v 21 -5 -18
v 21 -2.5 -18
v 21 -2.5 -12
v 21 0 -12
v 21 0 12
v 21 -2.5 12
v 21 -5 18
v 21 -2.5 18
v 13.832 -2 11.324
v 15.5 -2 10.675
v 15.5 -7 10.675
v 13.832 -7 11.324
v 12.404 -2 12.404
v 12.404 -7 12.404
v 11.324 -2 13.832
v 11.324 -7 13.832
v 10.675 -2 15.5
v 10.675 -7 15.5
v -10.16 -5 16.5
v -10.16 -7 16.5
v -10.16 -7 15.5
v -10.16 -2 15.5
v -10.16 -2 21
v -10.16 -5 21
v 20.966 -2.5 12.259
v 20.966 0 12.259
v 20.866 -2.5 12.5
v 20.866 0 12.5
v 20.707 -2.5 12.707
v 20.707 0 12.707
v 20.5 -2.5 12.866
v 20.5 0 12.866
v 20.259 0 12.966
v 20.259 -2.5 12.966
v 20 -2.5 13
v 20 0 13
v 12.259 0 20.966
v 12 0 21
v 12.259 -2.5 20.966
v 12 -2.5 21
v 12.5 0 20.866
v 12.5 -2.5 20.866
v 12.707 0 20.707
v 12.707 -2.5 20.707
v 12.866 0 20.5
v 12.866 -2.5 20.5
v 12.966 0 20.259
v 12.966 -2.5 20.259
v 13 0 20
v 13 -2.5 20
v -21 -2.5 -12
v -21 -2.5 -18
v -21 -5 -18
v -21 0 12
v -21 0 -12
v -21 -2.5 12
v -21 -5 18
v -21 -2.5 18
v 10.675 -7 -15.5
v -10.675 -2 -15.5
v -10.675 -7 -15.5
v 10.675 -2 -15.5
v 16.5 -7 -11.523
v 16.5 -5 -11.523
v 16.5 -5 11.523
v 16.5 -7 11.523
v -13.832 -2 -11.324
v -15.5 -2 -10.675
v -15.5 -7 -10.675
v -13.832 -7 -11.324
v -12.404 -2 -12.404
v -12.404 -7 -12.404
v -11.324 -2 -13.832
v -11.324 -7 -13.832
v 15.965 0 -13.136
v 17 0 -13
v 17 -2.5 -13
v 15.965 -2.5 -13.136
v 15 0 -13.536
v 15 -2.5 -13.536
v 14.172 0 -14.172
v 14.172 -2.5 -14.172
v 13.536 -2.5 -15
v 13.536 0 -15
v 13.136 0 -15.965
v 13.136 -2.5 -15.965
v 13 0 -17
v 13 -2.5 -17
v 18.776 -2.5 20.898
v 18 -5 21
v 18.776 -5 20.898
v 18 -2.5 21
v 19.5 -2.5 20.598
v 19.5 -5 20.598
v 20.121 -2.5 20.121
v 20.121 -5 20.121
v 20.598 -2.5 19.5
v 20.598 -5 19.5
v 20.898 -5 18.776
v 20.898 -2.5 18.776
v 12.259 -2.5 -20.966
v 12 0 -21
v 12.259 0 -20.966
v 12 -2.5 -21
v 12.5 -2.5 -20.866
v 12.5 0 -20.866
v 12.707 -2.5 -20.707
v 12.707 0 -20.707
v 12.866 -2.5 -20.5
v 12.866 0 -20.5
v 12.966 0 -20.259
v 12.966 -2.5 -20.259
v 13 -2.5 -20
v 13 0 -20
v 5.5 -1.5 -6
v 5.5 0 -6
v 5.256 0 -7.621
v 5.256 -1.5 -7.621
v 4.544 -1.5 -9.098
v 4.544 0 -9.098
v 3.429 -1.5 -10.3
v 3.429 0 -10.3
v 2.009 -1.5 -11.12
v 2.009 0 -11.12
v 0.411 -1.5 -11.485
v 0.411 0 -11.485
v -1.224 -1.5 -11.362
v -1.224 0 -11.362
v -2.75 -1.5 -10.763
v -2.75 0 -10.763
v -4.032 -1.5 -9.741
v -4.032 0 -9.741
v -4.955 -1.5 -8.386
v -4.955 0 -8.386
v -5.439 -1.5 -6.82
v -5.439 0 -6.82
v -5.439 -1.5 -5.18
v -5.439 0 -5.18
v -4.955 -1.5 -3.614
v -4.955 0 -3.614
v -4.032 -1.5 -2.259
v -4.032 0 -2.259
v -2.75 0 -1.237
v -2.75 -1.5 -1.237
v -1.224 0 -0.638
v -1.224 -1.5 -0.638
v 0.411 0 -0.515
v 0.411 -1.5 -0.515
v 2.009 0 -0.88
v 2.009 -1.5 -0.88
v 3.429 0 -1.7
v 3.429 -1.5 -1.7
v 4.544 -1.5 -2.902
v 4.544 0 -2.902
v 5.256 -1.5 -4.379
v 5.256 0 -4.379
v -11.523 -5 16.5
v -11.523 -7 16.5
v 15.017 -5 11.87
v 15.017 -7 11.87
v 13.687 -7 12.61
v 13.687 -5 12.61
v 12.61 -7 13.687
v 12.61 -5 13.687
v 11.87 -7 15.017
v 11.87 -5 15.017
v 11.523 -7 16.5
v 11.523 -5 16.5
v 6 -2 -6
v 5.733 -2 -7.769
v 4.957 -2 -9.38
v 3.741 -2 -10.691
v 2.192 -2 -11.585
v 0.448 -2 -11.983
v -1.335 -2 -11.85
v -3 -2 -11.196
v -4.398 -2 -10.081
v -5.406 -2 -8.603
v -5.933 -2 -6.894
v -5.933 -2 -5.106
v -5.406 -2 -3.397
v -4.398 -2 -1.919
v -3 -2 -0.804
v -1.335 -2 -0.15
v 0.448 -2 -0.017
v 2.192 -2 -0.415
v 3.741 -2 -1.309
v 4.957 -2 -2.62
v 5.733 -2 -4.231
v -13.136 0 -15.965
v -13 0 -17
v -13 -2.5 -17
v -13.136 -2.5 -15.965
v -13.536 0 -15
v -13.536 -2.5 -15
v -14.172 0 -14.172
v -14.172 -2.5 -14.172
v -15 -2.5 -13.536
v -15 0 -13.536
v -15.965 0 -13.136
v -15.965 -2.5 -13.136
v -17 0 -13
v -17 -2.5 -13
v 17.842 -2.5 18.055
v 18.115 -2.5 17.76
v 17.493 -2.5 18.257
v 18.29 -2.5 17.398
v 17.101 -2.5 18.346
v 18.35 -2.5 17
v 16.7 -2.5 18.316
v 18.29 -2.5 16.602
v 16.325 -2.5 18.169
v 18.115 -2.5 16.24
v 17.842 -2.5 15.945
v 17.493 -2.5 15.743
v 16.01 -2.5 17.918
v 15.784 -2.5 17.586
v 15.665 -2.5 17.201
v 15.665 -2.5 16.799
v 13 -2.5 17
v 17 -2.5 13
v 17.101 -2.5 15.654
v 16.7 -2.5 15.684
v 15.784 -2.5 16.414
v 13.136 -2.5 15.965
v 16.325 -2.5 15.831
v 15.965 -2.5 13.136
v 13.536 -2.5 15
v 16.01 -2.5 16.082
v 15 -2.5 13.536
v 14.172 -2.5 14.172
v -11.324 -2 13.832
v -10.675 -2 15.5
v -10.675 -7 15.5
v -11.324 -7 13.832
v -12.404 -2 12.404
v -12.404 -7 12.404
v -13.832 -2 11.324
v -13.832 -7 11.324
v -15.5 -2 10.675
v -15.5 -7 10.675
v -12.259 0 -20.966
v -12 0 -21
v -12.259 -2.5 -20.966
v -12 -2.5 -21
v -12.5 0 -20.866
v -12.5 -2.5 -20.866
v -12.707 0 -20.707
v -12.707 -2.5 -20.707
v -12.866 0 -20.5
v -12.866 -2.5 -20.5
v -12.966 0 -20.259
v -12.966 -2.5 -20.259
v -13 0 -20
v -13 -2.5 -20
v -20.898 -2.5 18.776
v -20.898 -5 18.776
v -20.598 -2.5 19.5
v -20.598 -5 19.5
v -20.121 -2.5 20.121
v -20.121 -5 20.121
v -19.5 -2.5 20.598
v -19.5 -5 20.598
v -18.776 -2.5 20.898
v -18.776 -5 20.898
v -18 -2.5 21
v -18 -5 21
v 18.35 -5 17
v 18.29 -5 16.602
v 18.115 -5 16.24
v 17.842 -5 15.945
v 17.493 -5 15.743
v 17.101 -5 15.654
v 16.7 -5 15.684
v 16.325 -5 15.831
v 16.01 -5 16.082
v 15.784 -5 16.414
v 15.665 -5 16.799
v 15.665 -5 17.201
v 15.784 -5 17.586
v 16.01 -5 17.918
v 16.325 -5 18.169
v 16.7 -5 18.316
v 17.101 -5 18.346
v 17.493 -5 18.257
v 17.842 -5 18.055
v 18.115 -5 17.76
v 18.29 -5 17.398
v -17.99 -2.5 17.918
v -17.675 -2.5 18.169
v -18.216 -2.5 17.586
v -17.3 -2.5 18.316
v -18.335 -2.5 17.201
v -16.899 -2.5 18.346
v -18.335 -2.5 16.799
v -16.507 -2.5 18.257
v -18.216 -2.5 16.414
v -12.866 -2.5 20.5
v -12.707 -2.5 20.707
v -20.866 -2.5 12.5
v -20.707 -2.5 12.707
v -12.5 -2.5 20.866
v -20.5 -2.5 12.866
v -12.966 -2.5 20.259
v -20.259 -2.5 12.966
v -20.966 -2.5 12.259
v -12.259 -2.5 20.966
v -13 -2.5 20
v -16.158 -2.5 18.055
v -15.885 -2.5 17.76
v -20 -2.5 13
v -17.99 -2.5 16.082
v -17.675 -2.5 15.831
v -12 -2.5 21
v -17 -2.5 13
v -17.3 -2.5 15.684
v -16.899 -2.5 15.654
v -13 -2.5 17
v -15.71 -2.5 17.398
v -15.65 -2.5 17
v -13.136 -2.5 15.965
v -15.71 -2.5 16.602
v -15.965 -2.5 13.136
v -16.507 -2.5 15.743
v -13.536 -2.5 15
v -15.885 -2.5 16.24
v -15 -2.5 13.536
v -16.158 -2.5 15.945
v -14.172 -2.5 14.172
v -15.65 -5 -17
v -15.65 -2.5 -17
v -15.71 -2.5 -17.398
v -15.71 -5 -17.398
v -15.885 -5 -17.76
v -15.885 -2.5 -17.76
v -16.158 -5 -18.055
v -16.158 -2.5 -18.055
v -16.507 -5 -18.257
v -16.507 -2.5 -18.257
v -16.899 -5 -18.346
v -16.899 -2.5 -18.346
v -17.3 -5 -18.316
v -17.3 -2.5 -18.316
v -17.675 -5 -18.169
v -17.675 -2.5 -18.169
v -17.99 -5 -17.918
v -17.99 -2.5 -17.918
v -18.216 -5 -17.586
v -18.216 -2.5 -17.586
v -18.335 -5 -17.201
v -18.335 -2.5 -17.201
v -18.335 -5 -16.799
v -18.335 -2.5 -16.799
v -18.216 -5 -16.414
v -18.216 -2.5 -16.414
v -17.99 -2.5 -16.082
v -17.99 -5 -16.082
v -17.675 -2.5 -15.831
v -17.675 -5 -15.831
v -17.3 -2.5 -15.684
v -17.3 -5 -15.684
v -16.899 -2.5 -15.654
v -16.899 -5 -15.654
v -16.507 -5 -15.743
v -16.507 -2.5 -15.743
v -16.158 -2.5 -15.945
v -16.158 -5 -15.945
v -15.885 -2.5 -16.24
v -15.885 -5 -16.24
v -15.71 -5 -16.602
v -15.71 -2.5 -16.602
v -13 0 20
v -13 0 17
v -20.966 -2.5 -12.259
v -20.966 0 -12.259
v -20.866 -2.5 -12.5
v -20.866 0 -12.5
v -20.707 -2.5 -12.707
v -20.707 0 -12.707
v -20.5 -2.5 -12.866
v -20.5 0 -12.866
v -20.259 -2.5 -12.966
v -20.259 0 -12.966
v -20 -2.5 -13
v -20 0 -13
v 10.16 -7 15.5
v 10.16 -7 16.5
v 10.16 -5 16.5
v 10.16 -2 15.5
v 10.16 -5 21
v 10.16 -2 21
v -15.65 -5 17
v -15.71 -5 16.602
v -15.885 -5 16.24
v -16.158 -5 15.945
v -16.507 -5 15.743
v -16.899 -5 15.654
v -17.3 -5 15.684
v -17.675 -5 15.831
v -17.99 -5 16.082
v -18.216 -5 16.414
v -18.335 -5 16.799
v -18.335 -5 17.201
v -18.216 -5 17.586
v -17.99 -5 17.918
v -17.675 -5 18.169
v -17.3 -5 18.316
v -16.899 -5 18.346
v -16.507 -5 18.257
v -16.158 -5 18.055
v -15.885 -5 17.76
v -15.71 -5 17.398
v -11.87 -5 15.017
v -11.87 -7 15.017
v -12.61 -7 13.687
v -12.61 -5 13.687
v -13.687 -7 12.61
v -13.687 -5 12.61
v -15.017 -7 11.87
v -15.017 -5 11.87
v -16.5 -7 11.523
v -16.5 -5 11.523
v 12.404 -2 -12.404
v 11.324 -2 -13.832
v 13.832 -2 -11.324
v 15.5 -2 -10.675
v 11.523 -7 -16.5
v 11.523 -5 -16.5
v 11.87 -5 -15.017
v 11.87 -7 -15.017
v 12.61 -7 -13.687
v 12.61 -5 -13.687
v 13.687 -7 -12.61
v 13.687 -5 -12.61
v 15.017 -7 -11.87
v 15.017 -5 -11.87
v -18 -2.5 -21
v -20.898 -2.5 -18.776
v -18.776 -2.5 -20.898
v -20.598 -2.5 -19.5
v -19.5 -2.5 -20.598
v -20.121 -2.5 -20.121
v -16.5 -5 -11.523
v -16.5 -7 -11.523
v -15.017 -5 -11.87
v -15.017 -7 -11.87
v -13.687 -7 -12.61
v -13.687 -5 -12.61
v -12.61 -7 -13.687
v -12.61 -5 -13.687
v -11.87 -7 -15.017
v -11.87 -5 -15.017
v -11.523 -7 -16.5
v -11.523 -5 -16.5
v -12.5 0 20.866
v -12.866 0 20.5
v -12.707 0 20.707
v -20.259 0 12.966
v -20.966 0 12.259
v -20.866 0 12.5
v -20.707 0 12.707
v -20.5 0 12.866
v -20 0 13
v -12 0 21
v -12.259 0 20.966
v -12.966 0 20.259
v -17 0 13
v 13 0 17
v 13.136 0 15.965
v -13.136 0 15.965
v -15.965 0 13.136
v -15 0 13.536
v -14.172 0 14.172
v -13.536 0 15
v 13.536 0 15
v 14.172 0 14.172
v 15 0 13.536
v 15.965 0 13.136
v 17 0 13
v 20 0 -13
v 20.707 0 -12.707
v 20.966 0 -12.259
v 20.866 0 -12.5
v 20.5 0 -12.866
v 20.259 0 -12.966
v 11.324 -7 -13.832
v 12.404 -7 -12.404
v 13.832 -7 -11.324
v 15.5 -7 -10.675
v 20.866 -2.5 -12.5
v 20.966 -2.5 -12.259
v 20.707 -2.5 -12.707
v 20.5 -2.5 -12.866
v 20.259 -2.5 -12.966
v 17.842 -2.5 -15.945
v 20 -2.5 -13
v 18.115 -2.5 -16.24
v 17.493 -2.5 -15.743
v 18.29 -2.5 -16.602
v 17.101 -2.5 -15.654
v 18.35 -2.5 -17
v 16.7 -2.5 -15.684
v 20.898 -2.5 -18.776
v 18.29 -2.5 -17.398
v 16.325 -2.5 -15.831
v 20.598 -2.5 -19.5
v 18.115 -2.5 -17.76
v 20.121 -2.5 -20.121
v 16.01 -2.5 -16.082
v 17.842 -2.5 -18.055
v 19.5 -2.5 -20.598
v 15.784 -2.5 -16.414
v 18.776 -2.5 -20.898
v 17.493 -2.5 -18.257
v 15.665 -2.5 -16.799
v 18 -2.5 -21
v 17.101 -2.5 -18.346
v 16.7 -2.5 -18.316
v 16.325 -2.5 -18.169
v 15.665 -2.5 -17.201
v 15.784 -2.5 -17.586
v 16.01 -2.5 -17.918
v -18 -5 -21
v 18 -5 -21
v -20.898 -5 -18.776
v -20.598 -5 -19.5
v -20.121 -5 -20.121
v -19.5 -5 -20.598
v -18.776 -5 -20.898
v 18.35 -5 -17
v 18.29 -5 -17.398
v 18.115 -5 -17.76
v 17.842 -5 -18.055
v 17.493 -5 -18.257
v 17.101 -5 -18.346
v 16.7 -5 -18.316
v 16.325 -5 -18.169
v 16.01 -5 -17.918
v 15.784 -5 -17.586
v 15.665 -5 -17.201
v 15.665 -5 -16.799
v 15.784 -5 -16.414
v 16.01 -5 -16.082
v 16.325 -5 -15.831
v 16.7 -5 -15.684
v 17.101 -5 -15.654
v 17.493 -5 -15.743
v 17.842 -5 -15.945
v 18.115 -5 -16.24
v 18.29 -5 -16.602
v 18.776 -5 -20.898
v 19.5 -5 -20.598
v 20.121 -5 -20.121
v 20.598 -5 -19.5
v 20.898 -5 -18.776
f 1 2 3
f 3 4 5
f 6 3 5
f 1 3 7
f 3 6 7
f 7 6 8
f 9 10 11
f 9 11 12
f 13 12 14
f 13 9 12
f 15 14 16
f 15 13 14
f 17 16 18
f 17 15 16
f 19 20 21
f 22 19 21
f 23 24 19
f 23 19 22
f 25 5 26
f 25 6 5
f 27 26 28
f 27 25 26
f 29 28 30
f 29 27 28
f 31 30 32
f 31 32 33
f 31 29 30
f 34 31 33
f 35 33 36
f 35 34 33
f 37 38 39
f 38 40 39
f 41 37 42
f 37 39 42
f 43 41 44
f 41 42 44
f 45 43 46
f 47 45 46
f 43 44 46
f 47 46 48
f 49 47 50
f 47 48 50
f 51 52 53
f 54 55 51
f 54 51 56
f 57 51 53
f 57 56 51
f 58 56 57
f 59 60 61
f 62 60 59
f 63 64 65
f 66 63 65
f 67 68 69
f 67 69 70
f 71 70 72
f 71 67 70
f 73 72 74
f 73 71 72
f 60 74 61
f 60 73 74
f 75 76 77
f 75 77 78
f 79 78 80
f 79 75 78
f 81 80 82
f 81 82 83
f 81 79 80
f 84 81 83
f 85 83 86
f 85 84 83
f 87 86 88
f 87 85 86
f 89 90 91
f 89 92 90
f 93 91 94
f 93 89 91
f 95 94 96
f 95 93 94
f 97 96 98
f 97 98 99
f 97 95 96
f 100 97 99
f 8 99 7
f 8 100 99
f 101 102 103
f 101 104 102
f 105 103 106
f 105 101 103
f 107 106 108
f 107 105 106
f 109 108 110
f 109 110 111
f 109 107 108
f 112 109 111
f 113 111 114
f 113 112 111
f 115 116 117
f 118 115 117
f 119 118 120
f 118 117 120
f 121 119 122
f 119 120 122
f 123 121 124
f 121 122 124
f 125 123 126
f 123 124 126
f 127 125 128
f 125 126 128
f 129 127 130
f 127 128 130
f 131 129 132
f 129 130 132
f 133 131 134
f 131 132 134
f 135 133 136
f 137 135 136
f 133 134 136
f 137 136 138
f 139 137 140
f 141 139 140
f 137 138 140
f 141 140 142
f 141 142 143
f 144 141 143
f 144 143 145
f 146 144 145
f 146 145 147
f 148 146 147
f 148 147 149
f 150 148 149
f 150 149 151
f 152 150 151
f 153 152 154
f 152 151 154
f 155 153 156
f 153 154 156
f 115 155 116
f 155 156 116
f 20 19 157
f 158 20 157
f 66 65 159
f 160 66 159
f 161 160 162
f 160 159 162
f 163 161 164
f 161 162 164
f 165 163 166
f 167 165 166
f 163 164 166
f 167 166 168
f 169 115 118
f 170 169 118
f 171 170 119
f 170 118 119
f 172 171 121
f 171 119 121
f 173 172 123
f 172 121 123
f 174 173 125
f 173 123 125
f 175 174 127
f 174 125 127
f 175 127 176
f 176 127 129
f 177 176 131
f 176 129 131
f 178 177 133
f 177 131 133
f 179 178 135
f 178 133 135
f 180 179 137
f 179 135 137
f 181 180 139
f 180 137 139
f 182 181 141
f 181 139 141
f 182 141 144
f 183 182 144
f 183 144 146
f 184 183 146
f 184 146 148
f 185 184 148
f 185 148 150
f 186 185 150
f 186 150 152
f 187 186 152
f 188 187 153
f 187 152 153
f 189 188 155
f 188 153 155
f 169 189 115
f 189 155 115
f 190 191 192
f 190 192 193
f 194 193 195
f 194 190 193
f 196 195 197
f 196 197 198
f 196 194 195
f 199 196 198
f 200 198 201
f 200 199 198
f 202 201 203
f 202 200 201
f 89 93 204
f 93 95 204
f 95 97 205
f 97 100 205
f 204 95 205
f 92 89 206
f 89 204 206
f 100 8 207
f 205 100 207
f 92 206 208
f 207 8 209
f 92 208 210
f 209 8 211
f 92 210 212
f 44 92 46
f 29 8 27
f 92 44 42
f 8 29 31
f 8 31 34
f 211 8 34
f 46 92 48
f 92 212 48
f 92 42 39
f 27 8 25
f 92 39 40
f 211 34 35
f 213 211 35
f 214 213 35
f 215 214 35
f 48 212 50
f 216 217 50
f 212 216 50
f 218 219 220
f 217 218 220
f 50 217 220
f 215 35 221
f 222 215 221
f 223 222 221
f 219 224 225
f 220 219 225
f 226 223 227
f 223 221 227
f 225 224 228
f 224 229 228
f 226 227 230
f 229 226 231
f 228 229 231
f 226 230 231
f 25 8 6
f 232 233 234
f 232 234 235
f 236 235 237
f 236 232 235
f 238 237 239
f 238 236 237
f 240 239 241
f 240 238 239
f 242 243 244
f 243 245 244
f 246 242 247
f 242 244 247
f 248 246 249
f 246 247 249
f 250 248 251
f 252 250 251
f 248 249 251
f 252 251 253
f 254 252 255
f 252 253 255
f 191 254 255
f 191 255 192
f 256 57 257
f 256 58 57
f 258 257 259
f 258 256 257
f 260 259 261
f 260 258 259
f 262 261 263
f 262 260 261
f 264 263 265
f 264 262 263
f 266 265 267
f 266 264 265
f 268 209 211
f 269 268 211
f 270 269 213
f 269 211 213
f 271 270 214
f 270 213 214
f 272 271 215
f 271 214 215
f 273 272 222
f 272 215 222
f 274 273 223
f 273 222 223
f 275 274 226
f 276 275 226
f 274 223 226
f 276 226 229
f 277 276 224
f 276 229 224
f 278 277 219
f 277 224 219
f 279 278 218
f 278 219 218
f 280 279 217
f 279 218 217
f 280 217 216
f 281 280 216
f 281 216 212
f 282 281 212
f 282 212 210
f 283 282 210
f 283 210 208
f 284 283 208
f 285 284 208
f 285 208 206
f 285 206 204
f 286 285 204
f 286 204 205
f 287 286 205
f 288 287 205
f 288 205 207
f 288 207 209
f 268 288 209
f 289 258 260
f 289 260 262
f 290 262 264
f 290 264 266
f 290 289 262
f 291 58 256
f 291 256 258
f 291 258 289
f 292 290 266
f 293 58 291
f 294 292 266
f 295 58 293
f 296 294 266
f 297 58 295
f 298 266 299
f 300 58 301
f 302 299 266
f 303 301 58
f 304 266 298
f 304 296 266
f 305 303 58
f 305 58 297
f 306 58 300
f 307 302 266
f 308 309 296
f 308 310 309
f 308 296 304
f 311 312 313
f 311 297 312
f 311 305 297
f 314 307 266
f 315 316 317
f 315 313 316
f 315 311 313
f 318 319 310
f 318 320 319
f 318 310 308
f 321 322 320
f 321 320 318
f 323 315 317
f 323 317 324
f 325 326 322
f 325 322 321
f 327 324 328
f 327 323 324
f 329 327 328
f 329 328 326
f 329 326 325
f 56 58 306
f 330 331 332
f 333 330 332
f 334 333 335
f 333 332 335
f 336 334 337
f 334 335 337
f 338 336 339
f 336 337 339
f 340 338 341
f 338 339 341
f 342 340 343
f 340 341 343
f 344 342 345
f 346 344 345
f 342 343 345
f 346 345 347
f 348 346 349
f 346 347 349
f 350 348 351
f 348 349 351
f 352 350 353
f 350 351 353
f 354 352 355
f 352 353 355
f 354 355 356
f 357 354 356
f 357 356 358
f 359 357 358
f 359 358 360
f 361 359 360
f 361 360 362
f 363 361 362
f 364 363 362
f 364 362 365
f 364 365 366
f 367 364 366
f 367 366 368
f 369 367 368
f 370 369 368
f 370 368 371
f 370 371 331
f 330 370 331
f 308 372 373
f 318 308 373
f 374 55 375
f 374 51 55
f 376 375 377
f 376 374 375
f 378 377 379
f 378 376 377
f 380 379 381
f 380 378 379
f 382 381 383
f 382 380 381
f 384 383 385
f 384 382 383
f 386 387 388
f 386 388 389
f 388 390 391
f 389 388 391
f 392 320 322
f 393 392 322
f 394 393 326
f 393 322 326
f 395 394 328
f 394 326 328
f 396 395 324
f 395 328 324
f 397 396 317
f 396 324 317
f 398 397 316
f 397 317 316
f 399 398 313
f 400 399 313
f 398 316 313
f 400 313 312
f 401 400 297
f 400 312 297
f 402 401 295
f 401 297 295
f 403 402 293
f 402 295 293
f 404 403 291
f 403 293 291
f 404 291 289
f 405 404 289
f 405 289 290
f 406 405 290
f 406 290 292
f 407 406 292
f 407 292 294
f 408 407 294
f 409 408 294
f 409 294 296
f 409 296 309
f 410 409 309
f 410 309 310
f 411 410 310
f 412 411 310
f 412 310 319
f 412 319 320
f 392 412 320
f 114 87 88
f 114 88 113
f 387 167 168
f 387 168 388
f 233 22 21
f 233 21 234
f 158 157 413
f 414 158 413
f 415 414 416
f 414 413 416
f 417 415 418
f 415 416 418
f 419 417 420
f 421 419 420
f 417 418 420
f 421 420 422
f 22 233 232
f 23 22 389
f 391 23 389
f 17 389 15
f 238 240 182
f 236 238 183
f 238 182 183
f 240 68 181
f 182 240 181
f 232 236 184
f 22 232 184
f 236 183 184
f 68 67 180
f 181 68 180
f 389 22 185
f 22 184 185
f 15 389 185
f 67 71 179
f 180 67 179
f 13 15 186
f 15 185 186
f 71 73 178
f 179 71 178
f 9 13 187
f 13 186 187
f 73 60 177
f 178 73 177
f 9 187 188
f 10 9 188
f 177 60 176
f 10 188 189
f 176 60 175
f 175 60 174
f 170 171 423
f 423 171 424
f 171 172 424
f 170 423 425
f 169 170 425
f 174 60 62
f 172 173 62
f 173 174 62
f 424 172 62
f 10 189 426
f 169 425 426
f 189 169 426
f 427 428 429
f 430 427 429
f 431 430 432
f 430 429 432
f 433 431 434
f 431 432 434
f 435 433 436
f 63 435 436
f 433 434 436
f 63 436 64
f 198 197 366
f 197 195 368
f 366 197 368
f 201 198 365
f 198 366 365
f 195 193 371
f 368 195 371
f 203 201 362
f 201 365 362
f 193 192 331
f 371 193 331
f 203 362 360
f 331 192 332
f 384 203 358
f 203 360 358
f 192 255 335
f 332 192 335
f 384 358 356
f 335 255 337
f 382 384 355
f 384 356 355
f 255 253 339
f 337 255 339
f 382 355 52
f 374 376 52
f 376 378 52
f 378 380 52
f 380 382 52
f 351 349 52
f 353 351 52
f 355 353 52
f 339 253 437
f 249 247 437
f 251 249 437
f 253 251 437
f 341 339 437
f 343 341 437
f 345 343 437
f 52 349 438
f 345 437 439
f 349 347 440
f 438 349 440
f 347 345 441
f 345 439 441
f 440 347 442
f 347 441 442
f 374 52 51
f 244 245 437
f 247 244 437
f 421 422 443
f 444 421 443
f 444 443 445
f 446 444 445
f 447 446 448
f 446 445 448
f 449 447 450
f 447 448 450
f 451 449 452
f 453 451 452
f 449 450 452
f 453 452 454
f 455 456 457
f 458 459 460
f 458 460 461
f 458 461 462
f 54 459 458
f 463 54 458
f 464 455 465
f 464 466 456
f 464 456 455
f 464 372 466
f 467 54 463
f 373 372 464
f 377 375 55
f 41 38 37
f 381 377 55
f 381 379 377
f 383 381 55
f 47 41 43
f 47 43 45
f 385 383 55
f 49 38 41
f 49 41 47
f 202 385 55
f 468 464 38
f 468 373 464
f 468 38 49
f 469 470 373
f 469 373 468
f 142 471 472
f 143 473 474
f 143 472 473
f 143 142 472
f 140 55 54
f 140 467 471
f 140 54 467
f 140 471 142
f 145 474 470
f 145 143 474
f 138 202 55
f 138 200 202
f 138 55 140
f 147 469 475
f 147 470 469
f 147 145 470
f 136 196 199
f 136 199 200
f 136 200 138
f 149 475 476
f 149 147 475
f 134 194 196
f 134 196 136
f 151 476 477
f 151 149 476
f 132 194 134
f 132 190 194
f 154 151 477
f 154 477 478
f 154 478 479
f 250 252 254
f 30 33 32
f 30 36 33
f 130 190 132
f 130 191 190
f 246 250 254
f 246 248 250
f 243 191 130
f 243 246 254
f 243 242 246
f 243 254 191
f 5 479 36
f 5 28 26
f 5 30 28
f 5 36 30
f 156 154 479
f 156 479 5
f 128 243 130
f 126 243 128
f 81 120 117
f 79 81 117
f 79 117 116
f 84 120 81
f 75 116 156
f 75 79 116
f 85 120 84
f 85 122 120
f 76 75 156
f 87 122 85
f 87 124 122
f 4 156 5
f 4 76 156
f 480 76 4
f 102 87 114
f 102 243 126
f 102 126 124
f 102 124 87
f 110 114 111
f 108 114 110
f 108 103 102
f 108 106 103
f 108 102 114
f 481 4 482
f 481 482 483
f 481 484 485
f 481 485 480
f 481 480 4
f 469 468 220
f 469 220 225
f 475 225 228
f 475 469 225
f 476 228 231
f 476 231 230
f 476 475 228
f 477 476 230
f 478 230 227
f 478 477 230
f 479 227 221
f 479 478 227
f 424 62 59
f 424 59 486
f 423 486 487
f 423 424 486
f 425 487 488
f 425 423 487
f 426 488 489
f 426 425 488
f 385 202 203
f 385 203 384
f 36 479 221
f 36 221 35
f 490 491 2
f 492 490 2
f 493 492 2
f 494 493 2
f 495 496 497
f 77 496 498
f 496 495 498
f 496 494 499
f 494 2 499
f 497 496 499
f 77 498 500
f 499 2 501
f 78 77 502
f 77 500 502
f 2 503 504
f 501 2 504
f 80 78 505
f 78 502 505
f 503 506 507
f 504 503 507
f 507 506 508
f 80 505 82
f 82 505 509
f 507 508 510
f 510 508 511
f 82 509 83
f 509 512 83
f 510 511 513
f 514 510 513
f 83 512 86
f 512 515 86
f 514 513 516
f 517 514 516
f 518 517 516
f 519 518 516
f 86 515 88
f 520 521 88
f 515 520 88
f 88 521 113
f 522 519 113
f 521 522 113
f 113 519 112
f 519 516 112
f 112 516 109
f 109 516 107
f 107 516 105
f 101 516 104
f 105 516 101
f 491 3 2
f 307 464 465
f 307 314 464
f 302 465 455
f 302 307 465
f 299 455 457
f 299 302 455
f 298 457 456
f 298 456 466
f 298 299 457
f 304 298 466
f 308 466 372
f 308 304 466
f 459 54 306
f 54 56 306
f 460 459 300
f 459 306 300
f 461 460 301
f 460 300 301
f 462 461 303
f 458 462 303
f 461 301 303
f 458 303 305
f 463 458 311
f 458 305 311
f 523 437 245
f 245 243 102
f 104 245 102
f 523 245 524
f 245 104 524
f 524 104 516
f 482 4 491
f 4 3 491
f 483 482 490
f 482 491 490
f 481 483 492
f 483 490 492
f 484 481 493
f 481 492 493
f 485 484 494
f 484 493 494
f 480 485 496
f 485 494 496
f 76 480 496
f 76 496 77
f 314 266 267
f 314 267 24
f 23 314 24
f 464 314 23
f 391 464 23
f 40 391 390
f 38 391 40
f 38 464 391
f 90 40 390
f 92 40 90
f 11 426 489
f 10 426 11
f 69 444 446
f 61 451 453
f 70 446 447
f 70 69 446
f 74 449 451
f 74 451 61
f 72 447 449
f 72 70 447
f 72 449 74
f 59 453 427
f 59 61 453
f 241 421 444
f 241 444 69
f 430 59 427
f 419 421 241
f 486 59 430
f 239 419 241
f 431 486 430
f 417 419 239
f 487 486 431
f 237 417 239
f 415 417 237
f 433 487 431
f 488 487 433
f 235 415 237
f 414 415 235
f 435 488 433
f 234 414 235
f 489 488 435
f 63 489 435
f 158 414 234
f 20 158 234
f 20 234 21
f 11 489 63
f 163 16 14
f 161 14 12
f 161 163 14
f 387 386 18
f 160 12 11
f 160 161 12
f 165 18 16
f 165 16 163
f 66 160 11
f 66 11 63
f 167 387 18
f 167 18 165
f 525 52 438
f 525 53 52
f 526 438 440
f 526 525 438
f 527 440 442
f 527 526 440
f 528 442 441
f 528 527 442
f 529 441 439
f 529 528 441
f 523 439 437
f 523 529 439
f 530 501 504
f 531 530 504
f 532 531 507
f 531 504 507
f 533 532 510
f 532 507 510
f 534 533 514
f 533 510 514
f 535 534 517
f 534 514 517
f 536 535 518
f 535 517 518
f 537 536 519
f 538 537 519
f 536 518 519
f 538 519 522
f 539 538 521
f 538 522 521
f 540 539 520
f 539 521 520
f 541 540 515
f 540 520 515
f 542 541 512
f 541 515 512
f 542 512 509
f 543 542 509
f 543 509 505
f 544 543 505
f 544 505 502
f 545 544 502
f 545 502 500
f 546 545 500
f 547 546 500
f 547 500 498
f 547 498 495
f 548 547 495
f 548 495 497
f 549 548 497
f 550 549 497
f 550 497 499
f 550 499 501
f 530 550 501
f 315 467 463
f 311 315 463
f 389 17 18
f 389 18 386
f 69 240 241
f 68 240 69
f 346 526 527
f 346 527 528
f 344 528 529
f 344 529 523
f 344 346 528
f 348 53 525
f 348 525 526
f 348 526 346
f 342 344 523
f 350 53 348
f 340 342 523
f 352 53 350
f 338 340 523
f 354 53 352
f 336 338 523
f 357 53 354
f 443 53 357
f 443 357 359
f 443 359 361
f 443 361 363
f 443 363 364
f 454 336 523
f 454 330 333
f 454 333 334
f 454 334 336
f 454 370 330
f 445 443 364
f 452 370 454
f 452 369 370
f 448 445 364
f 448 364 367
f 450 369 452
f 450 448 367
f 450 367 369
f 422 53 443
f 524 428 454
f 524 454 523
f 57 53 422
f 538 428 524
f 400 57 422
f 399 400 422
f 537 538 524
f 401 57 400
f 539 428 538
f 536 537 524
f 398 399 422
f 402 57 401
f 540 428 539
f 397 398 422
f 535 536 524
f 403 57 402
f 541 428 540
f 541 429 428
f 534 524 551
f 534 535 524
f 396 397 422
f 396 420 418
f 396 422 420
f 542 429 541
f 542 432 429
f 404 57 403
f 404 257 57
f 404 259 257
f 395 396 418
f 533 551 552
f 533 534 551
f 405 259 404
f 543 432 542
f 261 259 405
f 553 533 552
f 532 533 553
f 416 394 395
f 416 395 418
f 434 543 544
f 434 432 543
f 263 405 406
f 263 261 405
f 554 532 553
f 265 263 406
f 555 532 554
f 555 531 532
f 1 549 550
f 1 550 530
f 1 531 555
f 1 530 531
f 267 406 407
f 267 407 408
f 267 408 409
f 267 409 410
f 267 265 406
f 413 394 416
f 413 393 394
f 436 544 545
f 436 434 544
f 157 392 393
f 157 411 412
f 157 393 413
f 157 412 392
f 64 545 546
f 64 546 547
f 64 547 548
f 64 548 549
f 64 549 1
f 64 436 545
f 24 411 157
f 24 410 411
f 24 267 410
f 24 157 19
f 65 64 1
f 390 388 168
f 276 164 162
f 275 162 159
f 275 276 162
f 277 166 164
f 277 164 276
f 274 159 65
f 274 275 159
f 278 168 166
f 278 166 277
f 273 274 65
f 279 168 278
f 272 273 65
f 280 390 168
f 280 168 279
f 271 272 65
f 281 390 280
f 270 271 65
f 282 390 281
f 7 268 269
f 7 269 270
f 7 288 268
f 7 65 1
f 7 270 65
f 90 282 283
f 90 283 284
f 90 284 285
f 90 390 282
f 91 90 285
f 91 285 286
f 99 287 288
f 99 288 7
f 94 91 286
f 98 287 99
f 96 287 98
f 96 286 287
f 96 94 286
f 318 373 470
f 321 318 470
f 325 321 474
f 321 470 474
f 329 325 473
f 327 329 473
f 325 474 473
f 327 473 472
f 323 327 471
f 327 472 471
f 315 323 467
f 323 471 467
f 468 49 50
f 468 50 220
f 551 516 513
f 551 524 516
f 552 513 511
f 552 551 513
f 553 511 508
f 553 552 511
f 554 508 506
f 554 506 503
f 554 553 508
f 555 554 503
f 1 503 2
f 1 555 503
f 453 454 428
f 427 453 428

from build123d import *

# Parameters (mm, degrees)
SKETCH2_W           = 42
SKETCH2_H           = 42
SKETCH2_R           = 5.5
BOSS_EXTRUDE1_DEPTH = 2
SKETCH4_W           = 42
SKETCH4_H           = 42
BOSS_EXTRUDE2_DEPTH = 3
BOSS_EXTRUDE3_DEPTH = 3
BOSS_EXTRUDE5_DEPTH = 5
CUT_EXTRUDE1_DEPTH  = 2.5
SKETCH9_R           = 1.35
CUT_EXTRUDE2_DEPTH  = 8
FILLET1_R           = 3
FILLET2_R           = 1
CHAMFER1_SIZE       = 0.5
SKETCH10_W          = 20.32
SKETCH10_H          = 5
CUT_EXTRUDE3_DEPTH  = 5.5


with BuildPart() as part:
    # Sketch2 → Boss-Extrude1 (new body)
    with BuildSketch(Plane(origin=(0, 0, 0), x_dir=(1, 0, 0), z_dir=(0, 1, 0))):
        Rectangle(SKETCH2_W, SKETCH2_H)
        with Locations((0, 6)):
            Circle(SKETCH2_R, mode=Mode.SUBTRACT)
    extrude(amount=-BOSS_EXTRUDE1_DEPTH)

    # Sketch4 → Boss-Extrude2 (add)
    with BuildSketch(Plane.XZ.offset(2)):
        Rectangle(SKETCH4_W, SKETCH4_H)
        with BuildLine():
            Line((-17, 11.522774425), (-17, -11.522774425))
            ThreePointArc((-17, -11.522774425), (-16.869274473, -11.859874356), (-16.545454545, -12.020704023))
            ThreePointArc((-16.545454545, -12.020704023), (-13.464466094, -13.464466094), (-12.020704023, -16.545454545))
            ThreePointArc((-12.020704023, -16.545454545), (-11.859874356, -16.869274473), (-11.522774425, -17))
            Line((-11.522774425, -17), (11.522774425, -17))
            ThreePointArc((11.522774425, -17), (11.859874356, -16.869274473), (12.020704023, -16.545454545))
            ThreePointArc((12.020704023, -16.545454545), (13.464466094, -13.464466094), (16.545454545, -12.020704023))
            ThreePointArc((16.545454545, -12.020704023), (16.869274473, -11.859874356), (17, -11.522774425))
            Line((17, -11.522774425), (17, 11.522774425))
            ThreePointArc((17, 11.522774425), (16.869274473, 11.859874356), (16.545454545, 12.020704023))
            ThreePointArc((16.545454545, 12.020704023), (13.464466094, 13.464466094), (12.020704023, 16.545454545))
            ThreePointArc((12.020704023, 16.545454545), (11.859874356, 16.869274473), (11.522774425, 17))
            Line((11.522774425, 17), (-11.522774425, 17))
            ThreePointArc((-11.522774425, 17), (-11.859874356, 16.869274473), (-12.020704023, 16.545454545))
            ThreePointArc((-12.020704023, 16.545454545), (-13.464466094, 13.464466094), (-16.545454545, 12.020704023))
            ThreePointArc((-16.545454545, 12.020704023), (-16.869274473, 11.859874356), (-17, 11.522774425))
        make_face(mode=Mode.SUBTRACT)
    extrude(amount=BOSS_EXTRUDE2_DEPTH)

    # Sketch6 → Boss-Extrude3 (add)
    with BuildSketch(Plane.XZ.offset(2)):
        with BuildLine():
            Line((-17, 11.522774425), (-17, -11.522774425))
            ThreePointArc((-17, -11.522774425), (-16.869274473, -11.859874356), (-16.545454545, -12.020704023))
            ThreePointArc((-16.545454545, -12.020704023), (-13.464466094, -13.464466094), (-12.020704023, -16.545454545))
            ThreePointArc((-12.020704023, -16.545454545), (-11.859874356, -16.869274473), (-11.522774425, -17))
            Line((-11.522774425, -17), (11.522774425, -17))
            ThreePointArc((11.522774425, -17), (11.859874356, -16.869274473), (12.020704023, -16.545454545))
            ThreePointArc((12.020704023, -16.545454545), (13.464466094, -13.464466094), (16.545454545, -12.020704023))
            ThreePointArc((16.545454545, -12.020704023), (16.869274473, -11.859874356), (17, -11.522774425))
            Line((17, -11.522774425), (17, 11.522774425))
            ThreePointArc((17, 11.522774425), (16.869274473, 11.859874356), (16.545454545, 12.020704023))
            ThreePointArc((16.545454545, 12.020704023), (13.464466094, 13.464466094), (12.020704023, 16.545454545))
            ThreePointArc((12.020704023, 16.545454545), (11.859874356, 16.869274473), (11.522774425, 17))
            Line((11.522774425, 17), (-11.522774425, 17))
            ThreePointArc((-11.522774425, 17), (-11.859874356, 16.869274473), (-12.020704023, 16.545454545))
            ThreePointArc((-12.020704023, 16.545454545), (-13.464466094, 13.464466094), (-16.545454545, 12.020704023))
            ThreePointArc((-16.545454545, 12.020704023), (-16.869274473, 11.859874356), (-17, 11.522774425))
        make_face()
        with BuildLine():
            Line((-16.5, 11.522774425), (-16.5, -11.522774425))
            ThreePointArc((-16.5, -11.522774425), (-13.110912703, -13.110912703), (-11.522774425, -16.5))
            Line((-11.522774425, -16.5), (11.522774425, -16.5))
            ThreePointArc((11.522774425, -16.5), (13.110912703, -13.110912703), (16.5, -11.522774425))
            Line((16.5, -11.522774425), (16.5, 11.522774425))
            ThreePointArc((16.5, 11.522774425), (13.110912703, 13.110912703), (11.522774425, 16.5))
            Line((11.522774425, 16.5), (-11.522774425, 16.5))
            ThreePointArc((-11.522774425, 16.5), (-13.110912703, 13.110912703), (-16.5, 11.522774425))
        make_face(mode=Mode.SUBTRACT)
    extrude(amount=BOSS_EXTRUDE3_DEPTH)

    # Sketch7 → Boss-Extrude5 (add)
    with BuildSketch(Plane.XZ.offset(2)):
        with BuildLine():
            Line((11.522774425, 16.5), (-11.522774425, 16.5))
            ThreePointArc((-11.522774425, 16.5), (-13.110912703, 13.110912703), (-16.5, 11.522774425))
            Line((-16.5, 11.522774425), (-16.5, -11.522774425))
            ThreePointArc((-16.5, -11.522774425), (-13.110912703, -13.110912703), (-11.522774425, -16.5))
            Line((-11.522774425, -16.5), (11.522774425, -16.5))
            ThreePointArc((11.522774425, -16.5), (13.110912703, -13.110912703), (16.5, -11.522774425))
            Line((16.5, -11.522774425), (16.5, 11.522774425))
            ThreePointArc((16.5, 11.522774425), (13.110912703, 13.110912703), (11.522774425, 16.5))
        make_face()
        with BuildLine():
            Line((10.67544468, 15.5), (-10.67544468, 15.5))
            ThreePointArc((-10.67544468, 15.5), (-12.403805922, 12.403805922), (-15.5, 10.67544468))
            Line((-15.5, 10.67544468), (-15.5, -10.67544468))
            ThreePointArc((-15.5, -10.67544468), (-12.403805922, -12.403805922), (-10.67544468, -15.5))
            Line((-10.67544468, -15.5), (10.67544468, -15.5))
            ThreePointArc((10.67544468, -15.5), (12.403805922, -12.403805922), (15.5, -10.67544468))
            Line((15.5, -10.67544468), (15.5, 10.67544468))
            ThreePointArc((15.5, 10.67544468), (12.403805922, 12.403805922), (10.67544468, 15.5))
        make_face(mode=Mode.SUBTRACT)
    extrude(amount=BOSS_EXTRUDE5_DEPTH)

    # Sketch8 → Cut-Extrude1 (cut)
    with BuildSketch(Plane(origin=(0, 0, 0), x_dir=(1, 0, 0), z_dir=(0, 1, 0))):
        with BuildLine():
            Line((-17, 13), (-21, 13))
            Line((-21, 13), (-21, 21))
            Line((-21, 21), (-13, 21))
            Line((-13, 21), (-13, 17))
            ThreePointArc((-13, 17), (-14.171572875, 14.171572875), (-17, 13))
        make_face()
        with BuildLine():
            Line((13, 17), (13, 21))
            Line((13, 21), (21, 21))
            Line((21, 21), (21, 13))
            Line((21, 13), (17, 13))
            ThreePointArc((17, 13), (14.171572875, 14.171572875), (13, 17))
        make_face()
        with BuildLine():
            Line((-21, -17), (-21, -21))
            Line((-21, -21), (-17, -21))
            Line((-17, -21), (-13, -21))
            Line((-13, -21), (-13, -17))
            ThreePointArc((-13, -17), (-14.171572875, -14.171572875), (-17, -13))
            Line((-17, -13), (-21, -13))
            Line((-21, -13), (-21, -17))
        make_face()
        with BuildLine():
            Line((17, -13), (21, -13))
            Line((21, -13), (21, -21))
            Line((21, -21), (17, -21))
            Line((17, -21), (13, -21))
            Line((13, -21), (13, -17))
            ThreePointArc((13, -17), (14.171572875, -14.171572875), (17, -13))
        make_face()
    extrude(amount=-CUT_EXTRUDE1_DEPTH, mode=Mode.SUBTRACT)

    # Sketch9 → Cut-Extrude2 (cut, through all)
    with BuildSketch(Plane(origin=(0, 0, 0), x_dir=(1, 0, 0), z_dir=(0, 1, 0))):
        with Locations((-17, 17)):
            Circle(SKETCH9_R)
        with Locations((17, 17)):
            Circle(SKETCH9_R)
        with Locations((-17, -17)):
            Circle(SKETCH9_R)
        with Locations((17, -17)):
            Circle(SKETCH9_R)
    extrude(amount=-CUT_EXTRUDE2_DEPTH, mode=Mode.SUBTRACT)

    # Fillet1
    fillet1_edges = [part.edges().sort_by_distance(p)[0] for p in [
        (21, -3.75, 21),
        (-21, -3.75, 21),
        (-21, -3.75, -21),
        (21, -3.75, -21),
    ]]
    fillet(fillet1_edges, radius=FILLET1_R)

    # Fillet2
    fillet2_edges = [part.edges().sort_by_distance(p)[0] for p in [
        (13, -1.25, -21),
        (21, -1.25, -13),
        (-21, -1.25, 13),
        (-13, -1.25, 21),
        (21, -1.25, 13),
        (13, -1.25, 21),
        (-21, -1.25, -13),
        (-13, -1.25, -21),
    ]]
    fillet(fillet2_edges, radius=FILLET2_R)

    # Chamfer1
    chamfer1_edges = [part.edges().sort_by_distance(p)[0] for p in [
        (-5.5, -2, -6),
    ]]
    chamfer(chamfer1_edges, length=CHAMFER1_SIZE)

    # Sketch10 → Cut-Extrude3 (cut)
    with BuildSketch(Plane.XY.offset(21)):
        with Locations((0, -4.5)):
            Rectangle(SKETCH10_W, SKETCH10_H)
    extrude(amount=-CUT_EXTRUDE3_DEPTH, mode=Mode.SUBTRACT)


solid = part.part
